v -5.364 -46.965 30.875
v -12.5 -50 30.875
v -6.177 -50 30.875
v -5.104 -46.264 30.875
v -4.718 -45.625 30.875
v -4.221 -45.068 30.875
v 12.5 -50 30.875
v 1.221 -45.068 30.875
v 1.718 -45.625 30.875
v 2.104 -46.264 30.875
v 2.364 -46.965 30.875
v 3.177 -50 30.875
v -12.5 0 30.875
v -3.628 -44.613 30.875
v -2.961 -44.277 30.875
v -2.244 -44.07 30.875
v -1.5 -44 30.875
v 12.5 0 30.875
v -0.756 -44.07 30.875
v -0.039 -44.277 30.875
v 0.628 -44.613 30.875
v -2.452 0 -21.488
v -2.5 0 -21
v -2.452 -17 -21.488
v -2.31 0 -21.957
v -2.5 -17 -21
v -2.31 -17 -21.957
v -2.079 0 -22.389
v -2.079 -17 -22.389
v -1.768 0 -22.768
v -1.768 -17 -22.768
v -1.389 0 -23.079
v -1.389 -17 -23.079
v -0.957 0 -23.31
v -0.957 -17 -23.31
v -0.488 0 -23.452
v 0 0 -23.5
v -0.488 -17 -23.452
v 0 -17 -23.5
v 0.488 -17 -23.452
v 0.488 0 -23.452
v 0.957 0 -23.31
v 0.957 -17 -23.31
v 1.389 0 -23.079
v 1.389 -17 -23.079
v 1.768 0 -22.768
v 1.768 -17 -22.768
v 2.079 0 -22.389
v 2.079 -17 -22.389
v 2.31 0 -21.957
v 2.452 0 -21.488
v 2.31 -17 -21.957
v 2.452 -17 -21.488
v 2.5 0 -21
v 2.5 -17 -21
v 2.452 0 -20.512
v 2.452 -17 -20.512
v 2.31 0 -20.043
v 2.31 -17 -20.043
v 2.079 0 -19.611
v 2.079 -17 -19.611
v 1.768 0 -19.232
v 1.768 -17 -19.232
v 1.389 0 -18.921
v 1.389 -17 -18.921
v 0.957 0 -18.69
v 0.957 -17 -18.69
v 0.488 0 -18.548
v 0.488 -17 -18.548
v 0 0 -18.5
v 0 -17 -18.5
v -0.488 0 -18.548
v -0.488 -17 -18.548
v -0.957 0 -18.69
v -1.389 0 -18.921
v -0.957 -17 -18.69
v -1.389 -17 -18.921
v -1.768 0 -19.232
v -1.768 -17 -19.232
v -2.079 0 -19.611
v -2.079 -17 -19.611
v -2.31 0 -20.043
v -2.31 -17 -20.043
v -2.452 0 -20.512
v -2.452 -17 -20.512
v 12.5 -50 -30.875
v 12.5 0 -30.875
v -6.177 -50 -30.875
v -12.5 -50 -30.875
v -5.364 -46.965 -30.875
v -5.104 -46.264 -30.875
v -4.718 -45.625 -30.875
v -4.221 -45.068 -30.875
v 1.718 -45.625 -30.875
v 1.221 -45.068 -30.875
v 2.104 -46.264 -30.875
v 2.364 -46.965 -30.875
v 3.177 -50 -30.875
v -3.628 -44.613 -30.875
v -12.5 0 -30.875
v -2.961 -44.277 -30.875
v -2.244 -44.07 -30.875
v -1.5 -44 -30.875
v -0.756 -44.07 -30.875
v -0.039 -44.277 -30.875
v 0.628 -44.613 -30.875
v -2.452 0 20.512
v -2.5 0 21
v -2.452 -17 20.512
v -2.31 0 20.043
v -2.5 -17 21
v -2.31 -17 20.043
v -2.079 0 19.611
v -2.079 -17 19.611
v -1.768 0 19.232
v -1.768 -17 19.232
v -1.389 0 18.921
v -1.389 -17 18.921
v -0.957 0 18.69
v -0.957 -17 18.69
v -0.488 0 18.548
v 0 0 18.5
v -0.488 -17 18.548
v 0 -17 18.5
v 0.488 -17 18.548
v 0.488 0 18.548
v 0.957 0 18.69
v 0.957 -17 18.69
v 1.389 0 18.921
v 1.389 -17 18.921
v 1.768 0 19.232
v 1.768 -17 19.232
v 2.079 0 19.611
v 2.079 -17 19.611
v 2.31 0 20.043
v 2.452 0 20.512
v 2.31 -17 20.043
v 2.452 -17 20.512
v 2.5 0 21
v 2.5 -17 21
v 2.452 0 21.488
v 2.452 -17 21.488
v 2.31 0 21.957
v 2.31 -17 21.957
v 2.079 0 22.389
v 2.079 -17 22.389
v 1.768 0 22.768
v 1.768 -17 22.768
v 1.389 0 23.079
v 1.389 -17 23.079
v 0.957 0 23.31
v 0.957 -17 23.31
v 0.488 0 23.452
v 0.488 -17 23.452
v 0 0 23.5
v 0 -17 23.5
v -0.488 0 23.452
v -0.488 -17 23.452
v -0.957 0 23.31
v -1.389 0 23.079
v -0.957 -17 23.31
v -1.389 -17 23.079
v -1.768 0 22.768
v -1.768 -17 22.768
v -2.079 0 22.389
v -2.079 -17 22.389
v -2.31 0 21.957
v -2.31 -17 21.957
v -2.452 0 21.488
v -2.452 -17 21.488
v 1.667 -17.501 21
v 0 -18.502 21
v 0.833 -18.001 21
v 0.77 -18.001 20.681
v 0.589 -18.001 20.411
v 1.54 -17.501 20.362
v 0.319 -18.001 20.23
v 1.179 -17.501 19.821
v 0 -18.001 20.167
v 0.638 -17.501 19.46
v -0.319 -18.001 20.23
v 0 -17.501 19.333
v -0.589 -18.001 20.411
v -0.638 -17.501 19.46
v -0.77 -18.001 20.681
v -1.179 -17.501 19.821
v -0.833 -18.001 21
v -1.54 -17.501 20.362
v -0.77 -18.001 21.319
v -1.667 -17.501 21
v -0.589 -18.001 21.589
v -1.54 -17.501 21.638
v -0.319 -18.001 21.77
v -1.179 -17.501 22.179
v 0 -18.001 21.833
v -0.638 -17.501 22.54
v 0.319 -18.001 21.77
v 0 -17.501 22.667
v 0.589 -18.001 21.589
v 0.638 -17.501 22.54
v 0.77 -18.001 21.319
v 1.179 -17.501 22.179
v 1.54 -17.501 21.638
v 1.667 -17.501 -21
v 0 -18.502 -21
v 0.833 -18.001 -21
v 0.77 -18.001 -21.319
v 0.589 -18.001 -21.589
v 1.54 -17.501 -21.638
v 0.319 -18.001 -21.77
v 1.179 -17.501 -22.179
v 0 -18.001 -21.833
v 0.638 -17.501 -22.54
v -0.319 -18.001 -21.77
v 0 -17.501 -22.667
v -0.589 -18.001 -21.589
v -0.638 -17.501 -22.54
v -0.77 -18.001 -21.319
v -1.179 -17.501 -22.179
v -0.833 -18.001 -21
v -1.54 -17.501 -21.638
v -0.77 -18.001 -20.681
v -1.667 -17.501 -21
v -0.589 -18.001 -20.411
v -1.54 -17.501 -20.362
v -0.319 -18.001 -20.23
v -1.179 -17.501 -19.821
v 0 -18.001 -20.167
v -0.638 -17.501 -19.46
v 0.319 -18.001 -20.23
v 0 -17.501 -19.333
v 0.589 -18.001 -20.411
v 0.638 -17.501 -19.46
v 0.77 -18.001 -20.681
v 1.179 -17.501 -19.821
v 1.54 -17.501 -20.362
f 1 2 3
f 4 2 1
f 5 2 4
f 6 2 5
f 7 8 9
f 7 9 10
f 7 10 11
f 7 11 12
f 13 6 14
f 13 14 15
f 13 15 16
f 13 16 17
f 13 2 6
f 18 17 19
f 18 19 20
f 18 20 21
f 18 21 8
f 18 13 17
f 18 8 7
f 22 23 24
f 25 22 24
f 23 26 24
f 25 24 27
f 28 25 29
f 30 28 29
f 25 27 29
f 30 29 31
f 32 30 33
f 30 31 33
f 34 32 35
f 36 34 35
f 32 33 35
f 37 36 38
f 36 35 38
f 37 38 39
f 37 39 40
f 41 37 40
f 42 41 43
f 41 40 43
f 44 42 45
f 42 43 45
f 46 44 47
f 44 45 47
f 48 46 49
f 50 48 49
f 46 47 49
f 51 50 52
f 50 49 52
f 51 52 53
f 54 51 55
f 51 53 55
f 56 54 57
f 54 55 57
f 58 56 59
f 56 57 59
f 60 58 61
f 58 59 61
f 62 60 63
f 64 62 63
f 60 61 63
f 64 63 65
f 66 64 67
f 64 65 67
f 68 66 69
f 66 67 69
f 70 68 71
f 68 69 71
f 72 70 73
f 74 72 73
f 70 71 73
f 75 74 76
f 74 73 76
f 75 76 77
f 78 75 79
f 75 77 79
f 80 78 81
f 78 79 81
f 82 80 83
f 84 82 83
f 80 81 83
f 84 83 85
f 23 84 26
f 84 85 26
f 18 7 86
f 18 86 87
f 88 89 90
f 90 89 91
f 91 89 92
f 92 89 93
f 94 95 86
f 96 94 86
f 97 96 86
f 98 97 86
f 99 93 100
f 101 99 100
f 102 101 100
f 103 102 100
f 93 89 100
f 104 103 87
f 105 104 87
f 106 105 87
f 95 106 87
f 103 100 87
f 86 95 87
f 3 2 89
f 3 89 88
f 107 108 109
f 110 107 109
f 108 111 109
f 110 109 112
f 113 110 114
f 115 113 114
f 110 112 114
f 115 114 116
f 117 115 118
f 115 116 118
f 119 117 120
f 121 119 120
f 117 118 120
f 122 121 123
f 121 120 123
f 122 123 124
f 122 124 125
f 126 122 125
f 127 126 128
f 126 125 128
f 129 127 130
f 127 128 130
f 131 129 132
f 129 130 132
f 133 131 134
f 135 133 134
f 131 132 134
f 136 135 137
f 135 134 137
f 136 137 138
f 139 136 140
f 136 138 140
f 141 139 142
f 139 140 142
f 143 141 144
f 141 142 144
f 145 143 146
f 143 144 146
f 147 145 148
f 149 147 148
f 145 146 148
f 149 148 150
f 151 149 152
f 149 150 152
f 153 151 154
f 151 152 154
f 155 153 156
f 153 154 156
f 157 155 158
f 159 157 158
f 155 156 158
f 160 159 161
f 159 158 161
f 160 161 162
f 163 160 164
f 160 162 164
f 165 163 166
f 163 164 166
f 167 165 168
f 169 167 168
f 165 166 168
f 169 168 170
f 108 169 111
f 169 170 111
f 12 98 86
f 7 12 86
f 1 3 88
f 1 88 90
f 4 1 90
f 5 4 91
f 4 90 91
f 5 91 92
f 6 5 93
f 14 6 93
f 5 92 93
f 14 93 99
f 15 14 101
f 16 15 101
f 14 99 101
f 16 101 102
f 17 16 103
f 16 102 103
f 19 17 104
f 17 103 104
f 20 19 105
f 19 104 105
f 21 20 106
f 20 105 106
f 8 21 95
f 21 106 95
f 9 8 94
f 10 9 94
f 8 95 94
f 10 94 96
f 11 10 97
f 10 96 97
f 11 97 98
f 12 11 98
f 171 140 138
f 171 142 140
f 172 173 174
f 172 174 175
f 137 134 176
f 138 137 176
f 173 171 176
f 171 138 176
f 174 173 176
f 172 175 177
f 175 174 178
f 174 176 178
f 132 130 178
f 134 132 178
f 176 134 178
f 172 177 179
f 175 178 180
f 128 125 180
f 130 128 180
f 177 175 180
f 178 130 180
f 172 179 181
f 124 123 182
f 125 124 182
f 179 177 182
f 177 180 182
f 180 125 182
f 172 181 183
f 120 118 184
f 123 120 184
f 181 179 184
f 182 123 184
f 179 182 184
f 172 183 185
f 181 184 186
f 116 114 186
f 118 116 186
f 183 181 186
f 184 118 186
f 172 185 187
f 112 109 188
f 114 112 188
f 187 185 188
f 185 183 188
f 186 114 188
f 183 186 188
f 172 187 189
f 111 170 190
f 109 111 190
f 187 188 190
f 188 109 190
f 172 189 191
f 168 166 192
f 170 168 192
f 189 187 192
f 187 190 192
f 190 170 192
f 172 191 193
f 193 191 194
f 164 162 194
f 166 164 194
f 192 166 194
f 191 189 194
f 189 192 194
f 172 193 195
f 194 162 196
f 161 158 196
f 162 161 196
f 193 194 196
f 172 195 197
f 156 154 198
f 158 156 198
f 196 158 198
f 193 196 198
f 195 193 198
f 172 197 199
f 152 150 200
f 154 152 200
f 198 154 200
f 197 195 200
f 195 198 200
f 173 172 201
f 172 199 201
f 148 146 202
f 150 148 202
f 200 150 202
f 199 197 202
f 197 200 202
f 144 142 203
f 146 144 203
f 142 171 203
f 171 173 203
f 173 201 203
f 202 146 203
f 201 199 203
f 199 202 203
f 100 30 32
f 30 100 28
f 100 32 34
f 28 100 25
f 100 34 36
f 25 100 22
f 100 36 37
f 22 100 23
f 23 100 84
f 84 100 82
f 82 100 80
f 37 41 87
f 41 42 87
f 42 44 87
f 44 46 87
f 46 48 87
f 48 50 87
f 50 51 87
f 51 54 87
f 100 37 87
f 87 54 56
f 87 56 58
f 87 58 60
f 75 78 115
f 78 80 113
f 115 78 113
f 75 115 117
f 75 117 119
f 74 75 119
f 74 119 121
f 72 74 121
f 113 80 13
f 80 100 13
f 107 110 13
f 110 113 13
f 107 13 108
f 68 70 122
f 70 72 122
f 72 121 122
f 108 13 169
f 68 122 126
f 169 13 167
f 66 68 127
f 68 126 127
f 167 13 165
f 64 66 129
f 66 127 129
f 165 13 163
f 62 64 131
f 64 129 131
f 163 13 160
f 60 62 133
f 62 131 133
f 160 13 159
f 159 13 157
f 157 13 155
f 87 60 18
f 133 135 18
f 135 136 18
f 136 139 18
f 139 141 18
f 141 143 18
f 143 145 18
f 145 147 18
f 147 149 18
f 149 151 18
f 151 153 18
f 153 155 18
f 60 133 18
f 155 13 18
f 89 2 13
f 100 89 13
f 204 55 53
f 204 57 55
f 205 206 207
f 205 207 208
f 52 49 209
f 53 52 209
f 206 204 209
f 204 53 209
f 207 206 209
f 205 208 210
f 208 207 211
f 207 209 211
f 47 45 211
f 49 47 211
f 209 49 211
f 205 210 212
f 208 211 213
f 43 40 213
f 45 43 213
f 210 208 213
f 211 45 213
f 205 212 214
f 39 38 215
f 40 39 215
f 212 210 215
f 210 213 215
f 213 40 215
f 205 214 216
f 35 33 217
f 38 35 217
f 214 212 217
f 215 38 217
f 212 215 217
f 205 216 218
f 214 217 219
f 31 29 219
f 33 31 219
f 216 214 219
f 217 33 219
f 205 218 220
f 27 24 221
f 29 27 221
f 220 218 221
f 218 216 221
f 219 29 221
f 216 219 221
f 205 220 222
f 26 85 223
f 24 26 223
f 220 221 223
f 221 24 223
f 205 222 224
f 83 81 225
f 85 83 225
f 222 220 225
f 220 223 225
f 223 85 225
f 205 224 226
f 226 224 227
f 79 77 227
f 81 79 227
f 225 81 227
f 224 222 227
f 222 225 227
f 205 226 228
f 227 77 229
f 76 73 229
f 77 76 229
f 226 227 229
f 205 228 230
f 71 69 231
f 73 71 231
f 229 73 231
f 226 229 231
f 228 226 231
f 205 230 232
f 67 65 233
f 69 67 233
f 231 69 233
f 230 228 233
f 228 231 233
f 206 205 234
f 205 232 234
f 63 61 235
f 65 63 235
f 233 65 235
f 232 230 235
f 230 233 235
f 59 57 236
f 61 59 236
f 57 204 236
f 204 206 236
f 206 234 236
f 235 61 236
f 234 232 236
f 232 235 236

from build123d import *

# Parameters (mm, degrees)
SKETCH1_W             = 25
SKETCH1_H             = 50
BOSS_EXTRUDE1_DEPTH   = 30.875
CUT_EXTRUDE1_REACH    = 82.432
M6_TAPPED_HOLE1_D     = 5
M6_TAPPED_HOLE1_DEPTH = 17
M6_TAPPED_HOLE1_TIP   = 1.502151548


with BuildPart() as part:
    # Sketch1 → Boss-Extrude1 (new, symmetric)
    with BuildSketch(Plane.XY):
        with Locations((0, -25)):
            Rectangle(SKETCH1_W, SKETCH1_H)
    extrude(amount=BOSS_EXTRUDE1_DEPTH, both=True)

    # Sketch2 → Cut-Extrude1 (cut, up to next)
    with BuildSketch(Plane(origin=(0, 0, -30.875), x_dir=(-1, 0, 0), z_dir=(0, 0, -1)), mode=Mode.PRIVATE) as cut_extrude1_sk1:
        with BuildLine():
            Line((-2.363703305, -46.96472382), (-3.177003107, -50))
            Line((-3.177003107, -50), (6.177003107, -50))
            Line((6.177003107, -50), (5.363703305, -46.96472382))
            ThreePointArc((5.363703305, -46.96472382), (1.5, -44), (-2.363703305, -46.96472382))
        make_face()
    cut_extrude1_tool1 = extrude(cut_extrude1_sk1.sketch, amount=-CUT_EXTRUDE1_REACH, mode=Mode.PRIVATE) & part.part
    add(cut_extrude1_tool1.solids().sort_by_distance((-1.5, -47.423831, -30.875))[0], mode=Mode.SUBTRACT)

    # M6 Tapped Hole1
    with Locations(Plane(origin=(0, 0, 0), x_dir=(1, 0, 0), z_dir=(0, 1, 0))):
        with Locations((0, 21), (0, -21)):
            Hole(M6_TAPPED_HOLE1_D / 2, depth=M6_TAPPED_HOLE1_DEPTH)
            with Locations((0, 0, -(M6_TAPPED_HOLE1_DEPTH + M6_TAPPED_HOLE1_TIP / 2))):  # 118° drill point
                Cone(0, M6_TAPPED_HOLE1_D / 2, M6_TAPPED_HOLE1_TIP, mode=Mode.SUBTRACT)


solid = part.part
